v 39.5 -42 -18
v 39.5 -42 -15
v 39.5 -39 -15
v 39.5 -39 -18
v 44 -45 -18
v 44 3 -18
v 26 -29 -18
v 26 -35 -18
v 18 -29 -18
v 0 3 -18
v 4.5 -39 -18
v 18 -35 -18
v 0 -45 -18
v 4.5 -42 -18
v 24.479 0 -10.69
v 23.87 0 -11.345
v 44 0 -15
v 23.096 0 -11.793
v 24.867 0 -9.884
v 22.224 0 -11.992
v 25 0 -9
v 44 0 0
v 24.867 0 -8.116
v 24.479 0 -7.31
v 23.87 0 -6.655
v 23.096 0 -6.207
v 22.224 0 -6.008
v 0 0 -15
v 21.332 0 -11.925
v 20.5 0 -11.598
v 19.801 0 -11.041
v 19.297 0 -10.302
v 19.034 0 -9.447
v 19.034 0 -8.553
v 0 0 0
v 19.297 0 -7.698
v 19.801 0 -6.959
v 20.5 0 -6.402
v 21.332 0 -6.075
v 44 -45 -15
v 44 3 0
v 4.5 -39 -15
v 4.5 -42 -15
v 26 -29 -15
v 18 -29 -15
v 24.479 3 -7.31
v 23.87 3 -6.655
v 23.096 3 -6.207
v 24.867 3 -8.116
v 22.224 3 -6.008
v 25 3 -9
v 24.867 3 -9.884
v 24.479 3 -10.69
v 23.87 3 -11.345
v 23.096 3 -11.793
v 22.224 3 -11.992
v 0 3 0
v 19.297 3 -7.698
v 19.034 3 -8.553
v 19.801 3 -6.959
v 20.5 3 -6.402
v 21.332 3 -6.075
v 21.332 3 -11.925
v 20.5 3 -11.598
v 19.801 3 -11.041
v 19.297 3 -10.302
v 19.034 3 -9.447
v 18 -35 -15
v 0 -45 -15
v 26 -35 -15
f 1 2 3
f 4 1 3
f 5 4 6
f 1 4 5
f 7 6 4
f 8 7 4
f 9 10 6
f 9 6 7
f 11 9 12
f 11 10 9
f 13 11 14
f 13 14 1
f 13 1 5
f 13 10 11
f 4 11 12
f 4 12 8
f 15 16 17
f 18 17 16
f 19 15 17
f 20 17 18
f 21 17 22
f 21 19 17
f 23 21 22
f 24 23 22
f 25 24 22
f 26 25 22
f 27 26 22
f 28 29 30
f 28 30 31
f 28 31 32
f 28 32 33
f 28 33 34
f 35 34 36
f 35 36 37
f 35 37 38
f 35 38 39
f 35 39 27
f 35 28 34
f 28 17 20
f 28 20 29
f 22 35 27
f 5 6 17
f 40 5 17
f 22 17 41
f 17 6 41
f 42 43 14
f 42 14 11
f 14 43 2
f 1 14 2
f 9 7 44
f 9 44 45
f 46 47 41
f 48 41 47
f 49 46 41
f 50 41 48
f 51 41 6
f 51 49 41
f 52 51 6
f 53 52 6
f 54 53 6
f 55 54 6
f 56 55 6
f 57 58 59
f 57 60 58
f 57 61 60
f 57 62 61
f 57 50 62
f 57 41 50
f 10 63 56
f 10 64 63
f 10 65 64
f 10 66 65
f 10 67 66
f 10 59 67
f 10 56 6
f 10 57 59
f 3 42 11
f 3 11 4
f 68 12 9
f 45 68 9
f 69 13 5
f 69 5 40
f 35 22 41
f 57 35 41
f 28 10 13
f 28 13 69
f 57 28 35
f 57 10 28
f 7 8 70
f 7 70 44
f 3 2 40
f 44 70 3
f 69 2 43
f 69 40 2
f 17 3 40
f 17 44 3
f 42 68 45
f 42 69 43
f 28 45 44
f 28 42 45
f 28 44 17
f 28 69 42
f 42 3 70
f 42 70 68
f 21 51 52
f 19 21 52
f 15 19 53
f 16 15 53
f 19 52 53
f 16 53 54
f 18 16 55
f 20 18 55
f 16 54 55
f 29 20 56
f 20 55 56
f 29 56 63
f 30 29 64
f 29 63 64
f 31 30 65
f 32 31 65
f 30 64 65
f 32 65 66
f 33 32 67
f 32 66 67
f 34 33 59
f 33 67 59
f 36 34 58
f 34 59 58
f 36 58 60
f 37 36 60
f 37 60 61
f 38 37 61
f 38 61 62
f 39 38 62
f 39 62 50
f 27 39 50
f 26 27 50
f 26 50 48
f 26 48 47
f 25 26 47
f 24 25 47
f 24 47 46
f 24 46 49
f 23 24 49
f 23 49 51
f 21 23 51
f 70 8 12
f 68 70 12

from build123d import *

# Parameters (mm, degrees)
ESTRUSIONE_ESTRUSIONE6_DEPTH = 44
SCHIZZO9_W                   = 35
SCHIZZO9_H                   = 3
TAGLIO_ESTRUSIONE2_DEPTH     = 44
SCHIZZO10_R                  = 3
TAGLIO_ESTRUSIONE3_DEPTH     = 10
SCHIZZO11_W                  = 8
SCHIZZO11_H                  = 6
TAGLIO_ESTRUSIONE4_DEPTH     = 10


with BuildPart() as part:
    # Schizzo8 → Estrusione-Estrusione6 (new body)
    with BuildSketch(Plane(origin=(0, 0, 0), x_dir=(0, 0, -1), z_dir=(1, 0, 0))):
        Polygon((0, 0), (0, 3), (18, 3), (18, -45), (15, -45), (15, 0), align=None)
    extrude(amount=ESTRUSIONE_ESTRUSIONE6_DEPTH)

    # Schizzo9 → Taglio-Estrusione2 (cut)
    with BuildSketch(Plane.XY.offset(-15)):
        with Locations((22, -40.5)):
            Rectangle(SCHIZZO9_W, SCHIZZO9_H)
    extrude(amount=-TAGLIO_ESTRUSIONE2_DEPTH, mode=Mode.SUBTRACT)

    # Schizzo10 → Taglio-Estrusione3 (cut)
    with BuildSketch(Plane(origin=(0, 3, 0), x_dir=(1, 0, 0), z_dir=(0, 1, 0))):
        with Locations((22, 9)):
            Circle(SCHIZZO10_R)
    extrude(amount=-TAGLIO_ESTRUSIONE3_DEPTH, mode=Mode.SUBTRACT)

    # Schizzo11 → Taglio-Estrusione4 (cut)
    with BuildSketch(Plane(origin=(0, 0, -18), x_dir=(-1, 0, 0), z_dir=(0, 0, -1))):
        with Locations((-22, -32)):
            Rectangle(SCHIZZO11_W, SCHIZZO11_H)
    extrude(amount=-TAGLIO_ESTRUSIONE4_DEPTH, mode=Mode.SUBTRACT)


solid = part.part
